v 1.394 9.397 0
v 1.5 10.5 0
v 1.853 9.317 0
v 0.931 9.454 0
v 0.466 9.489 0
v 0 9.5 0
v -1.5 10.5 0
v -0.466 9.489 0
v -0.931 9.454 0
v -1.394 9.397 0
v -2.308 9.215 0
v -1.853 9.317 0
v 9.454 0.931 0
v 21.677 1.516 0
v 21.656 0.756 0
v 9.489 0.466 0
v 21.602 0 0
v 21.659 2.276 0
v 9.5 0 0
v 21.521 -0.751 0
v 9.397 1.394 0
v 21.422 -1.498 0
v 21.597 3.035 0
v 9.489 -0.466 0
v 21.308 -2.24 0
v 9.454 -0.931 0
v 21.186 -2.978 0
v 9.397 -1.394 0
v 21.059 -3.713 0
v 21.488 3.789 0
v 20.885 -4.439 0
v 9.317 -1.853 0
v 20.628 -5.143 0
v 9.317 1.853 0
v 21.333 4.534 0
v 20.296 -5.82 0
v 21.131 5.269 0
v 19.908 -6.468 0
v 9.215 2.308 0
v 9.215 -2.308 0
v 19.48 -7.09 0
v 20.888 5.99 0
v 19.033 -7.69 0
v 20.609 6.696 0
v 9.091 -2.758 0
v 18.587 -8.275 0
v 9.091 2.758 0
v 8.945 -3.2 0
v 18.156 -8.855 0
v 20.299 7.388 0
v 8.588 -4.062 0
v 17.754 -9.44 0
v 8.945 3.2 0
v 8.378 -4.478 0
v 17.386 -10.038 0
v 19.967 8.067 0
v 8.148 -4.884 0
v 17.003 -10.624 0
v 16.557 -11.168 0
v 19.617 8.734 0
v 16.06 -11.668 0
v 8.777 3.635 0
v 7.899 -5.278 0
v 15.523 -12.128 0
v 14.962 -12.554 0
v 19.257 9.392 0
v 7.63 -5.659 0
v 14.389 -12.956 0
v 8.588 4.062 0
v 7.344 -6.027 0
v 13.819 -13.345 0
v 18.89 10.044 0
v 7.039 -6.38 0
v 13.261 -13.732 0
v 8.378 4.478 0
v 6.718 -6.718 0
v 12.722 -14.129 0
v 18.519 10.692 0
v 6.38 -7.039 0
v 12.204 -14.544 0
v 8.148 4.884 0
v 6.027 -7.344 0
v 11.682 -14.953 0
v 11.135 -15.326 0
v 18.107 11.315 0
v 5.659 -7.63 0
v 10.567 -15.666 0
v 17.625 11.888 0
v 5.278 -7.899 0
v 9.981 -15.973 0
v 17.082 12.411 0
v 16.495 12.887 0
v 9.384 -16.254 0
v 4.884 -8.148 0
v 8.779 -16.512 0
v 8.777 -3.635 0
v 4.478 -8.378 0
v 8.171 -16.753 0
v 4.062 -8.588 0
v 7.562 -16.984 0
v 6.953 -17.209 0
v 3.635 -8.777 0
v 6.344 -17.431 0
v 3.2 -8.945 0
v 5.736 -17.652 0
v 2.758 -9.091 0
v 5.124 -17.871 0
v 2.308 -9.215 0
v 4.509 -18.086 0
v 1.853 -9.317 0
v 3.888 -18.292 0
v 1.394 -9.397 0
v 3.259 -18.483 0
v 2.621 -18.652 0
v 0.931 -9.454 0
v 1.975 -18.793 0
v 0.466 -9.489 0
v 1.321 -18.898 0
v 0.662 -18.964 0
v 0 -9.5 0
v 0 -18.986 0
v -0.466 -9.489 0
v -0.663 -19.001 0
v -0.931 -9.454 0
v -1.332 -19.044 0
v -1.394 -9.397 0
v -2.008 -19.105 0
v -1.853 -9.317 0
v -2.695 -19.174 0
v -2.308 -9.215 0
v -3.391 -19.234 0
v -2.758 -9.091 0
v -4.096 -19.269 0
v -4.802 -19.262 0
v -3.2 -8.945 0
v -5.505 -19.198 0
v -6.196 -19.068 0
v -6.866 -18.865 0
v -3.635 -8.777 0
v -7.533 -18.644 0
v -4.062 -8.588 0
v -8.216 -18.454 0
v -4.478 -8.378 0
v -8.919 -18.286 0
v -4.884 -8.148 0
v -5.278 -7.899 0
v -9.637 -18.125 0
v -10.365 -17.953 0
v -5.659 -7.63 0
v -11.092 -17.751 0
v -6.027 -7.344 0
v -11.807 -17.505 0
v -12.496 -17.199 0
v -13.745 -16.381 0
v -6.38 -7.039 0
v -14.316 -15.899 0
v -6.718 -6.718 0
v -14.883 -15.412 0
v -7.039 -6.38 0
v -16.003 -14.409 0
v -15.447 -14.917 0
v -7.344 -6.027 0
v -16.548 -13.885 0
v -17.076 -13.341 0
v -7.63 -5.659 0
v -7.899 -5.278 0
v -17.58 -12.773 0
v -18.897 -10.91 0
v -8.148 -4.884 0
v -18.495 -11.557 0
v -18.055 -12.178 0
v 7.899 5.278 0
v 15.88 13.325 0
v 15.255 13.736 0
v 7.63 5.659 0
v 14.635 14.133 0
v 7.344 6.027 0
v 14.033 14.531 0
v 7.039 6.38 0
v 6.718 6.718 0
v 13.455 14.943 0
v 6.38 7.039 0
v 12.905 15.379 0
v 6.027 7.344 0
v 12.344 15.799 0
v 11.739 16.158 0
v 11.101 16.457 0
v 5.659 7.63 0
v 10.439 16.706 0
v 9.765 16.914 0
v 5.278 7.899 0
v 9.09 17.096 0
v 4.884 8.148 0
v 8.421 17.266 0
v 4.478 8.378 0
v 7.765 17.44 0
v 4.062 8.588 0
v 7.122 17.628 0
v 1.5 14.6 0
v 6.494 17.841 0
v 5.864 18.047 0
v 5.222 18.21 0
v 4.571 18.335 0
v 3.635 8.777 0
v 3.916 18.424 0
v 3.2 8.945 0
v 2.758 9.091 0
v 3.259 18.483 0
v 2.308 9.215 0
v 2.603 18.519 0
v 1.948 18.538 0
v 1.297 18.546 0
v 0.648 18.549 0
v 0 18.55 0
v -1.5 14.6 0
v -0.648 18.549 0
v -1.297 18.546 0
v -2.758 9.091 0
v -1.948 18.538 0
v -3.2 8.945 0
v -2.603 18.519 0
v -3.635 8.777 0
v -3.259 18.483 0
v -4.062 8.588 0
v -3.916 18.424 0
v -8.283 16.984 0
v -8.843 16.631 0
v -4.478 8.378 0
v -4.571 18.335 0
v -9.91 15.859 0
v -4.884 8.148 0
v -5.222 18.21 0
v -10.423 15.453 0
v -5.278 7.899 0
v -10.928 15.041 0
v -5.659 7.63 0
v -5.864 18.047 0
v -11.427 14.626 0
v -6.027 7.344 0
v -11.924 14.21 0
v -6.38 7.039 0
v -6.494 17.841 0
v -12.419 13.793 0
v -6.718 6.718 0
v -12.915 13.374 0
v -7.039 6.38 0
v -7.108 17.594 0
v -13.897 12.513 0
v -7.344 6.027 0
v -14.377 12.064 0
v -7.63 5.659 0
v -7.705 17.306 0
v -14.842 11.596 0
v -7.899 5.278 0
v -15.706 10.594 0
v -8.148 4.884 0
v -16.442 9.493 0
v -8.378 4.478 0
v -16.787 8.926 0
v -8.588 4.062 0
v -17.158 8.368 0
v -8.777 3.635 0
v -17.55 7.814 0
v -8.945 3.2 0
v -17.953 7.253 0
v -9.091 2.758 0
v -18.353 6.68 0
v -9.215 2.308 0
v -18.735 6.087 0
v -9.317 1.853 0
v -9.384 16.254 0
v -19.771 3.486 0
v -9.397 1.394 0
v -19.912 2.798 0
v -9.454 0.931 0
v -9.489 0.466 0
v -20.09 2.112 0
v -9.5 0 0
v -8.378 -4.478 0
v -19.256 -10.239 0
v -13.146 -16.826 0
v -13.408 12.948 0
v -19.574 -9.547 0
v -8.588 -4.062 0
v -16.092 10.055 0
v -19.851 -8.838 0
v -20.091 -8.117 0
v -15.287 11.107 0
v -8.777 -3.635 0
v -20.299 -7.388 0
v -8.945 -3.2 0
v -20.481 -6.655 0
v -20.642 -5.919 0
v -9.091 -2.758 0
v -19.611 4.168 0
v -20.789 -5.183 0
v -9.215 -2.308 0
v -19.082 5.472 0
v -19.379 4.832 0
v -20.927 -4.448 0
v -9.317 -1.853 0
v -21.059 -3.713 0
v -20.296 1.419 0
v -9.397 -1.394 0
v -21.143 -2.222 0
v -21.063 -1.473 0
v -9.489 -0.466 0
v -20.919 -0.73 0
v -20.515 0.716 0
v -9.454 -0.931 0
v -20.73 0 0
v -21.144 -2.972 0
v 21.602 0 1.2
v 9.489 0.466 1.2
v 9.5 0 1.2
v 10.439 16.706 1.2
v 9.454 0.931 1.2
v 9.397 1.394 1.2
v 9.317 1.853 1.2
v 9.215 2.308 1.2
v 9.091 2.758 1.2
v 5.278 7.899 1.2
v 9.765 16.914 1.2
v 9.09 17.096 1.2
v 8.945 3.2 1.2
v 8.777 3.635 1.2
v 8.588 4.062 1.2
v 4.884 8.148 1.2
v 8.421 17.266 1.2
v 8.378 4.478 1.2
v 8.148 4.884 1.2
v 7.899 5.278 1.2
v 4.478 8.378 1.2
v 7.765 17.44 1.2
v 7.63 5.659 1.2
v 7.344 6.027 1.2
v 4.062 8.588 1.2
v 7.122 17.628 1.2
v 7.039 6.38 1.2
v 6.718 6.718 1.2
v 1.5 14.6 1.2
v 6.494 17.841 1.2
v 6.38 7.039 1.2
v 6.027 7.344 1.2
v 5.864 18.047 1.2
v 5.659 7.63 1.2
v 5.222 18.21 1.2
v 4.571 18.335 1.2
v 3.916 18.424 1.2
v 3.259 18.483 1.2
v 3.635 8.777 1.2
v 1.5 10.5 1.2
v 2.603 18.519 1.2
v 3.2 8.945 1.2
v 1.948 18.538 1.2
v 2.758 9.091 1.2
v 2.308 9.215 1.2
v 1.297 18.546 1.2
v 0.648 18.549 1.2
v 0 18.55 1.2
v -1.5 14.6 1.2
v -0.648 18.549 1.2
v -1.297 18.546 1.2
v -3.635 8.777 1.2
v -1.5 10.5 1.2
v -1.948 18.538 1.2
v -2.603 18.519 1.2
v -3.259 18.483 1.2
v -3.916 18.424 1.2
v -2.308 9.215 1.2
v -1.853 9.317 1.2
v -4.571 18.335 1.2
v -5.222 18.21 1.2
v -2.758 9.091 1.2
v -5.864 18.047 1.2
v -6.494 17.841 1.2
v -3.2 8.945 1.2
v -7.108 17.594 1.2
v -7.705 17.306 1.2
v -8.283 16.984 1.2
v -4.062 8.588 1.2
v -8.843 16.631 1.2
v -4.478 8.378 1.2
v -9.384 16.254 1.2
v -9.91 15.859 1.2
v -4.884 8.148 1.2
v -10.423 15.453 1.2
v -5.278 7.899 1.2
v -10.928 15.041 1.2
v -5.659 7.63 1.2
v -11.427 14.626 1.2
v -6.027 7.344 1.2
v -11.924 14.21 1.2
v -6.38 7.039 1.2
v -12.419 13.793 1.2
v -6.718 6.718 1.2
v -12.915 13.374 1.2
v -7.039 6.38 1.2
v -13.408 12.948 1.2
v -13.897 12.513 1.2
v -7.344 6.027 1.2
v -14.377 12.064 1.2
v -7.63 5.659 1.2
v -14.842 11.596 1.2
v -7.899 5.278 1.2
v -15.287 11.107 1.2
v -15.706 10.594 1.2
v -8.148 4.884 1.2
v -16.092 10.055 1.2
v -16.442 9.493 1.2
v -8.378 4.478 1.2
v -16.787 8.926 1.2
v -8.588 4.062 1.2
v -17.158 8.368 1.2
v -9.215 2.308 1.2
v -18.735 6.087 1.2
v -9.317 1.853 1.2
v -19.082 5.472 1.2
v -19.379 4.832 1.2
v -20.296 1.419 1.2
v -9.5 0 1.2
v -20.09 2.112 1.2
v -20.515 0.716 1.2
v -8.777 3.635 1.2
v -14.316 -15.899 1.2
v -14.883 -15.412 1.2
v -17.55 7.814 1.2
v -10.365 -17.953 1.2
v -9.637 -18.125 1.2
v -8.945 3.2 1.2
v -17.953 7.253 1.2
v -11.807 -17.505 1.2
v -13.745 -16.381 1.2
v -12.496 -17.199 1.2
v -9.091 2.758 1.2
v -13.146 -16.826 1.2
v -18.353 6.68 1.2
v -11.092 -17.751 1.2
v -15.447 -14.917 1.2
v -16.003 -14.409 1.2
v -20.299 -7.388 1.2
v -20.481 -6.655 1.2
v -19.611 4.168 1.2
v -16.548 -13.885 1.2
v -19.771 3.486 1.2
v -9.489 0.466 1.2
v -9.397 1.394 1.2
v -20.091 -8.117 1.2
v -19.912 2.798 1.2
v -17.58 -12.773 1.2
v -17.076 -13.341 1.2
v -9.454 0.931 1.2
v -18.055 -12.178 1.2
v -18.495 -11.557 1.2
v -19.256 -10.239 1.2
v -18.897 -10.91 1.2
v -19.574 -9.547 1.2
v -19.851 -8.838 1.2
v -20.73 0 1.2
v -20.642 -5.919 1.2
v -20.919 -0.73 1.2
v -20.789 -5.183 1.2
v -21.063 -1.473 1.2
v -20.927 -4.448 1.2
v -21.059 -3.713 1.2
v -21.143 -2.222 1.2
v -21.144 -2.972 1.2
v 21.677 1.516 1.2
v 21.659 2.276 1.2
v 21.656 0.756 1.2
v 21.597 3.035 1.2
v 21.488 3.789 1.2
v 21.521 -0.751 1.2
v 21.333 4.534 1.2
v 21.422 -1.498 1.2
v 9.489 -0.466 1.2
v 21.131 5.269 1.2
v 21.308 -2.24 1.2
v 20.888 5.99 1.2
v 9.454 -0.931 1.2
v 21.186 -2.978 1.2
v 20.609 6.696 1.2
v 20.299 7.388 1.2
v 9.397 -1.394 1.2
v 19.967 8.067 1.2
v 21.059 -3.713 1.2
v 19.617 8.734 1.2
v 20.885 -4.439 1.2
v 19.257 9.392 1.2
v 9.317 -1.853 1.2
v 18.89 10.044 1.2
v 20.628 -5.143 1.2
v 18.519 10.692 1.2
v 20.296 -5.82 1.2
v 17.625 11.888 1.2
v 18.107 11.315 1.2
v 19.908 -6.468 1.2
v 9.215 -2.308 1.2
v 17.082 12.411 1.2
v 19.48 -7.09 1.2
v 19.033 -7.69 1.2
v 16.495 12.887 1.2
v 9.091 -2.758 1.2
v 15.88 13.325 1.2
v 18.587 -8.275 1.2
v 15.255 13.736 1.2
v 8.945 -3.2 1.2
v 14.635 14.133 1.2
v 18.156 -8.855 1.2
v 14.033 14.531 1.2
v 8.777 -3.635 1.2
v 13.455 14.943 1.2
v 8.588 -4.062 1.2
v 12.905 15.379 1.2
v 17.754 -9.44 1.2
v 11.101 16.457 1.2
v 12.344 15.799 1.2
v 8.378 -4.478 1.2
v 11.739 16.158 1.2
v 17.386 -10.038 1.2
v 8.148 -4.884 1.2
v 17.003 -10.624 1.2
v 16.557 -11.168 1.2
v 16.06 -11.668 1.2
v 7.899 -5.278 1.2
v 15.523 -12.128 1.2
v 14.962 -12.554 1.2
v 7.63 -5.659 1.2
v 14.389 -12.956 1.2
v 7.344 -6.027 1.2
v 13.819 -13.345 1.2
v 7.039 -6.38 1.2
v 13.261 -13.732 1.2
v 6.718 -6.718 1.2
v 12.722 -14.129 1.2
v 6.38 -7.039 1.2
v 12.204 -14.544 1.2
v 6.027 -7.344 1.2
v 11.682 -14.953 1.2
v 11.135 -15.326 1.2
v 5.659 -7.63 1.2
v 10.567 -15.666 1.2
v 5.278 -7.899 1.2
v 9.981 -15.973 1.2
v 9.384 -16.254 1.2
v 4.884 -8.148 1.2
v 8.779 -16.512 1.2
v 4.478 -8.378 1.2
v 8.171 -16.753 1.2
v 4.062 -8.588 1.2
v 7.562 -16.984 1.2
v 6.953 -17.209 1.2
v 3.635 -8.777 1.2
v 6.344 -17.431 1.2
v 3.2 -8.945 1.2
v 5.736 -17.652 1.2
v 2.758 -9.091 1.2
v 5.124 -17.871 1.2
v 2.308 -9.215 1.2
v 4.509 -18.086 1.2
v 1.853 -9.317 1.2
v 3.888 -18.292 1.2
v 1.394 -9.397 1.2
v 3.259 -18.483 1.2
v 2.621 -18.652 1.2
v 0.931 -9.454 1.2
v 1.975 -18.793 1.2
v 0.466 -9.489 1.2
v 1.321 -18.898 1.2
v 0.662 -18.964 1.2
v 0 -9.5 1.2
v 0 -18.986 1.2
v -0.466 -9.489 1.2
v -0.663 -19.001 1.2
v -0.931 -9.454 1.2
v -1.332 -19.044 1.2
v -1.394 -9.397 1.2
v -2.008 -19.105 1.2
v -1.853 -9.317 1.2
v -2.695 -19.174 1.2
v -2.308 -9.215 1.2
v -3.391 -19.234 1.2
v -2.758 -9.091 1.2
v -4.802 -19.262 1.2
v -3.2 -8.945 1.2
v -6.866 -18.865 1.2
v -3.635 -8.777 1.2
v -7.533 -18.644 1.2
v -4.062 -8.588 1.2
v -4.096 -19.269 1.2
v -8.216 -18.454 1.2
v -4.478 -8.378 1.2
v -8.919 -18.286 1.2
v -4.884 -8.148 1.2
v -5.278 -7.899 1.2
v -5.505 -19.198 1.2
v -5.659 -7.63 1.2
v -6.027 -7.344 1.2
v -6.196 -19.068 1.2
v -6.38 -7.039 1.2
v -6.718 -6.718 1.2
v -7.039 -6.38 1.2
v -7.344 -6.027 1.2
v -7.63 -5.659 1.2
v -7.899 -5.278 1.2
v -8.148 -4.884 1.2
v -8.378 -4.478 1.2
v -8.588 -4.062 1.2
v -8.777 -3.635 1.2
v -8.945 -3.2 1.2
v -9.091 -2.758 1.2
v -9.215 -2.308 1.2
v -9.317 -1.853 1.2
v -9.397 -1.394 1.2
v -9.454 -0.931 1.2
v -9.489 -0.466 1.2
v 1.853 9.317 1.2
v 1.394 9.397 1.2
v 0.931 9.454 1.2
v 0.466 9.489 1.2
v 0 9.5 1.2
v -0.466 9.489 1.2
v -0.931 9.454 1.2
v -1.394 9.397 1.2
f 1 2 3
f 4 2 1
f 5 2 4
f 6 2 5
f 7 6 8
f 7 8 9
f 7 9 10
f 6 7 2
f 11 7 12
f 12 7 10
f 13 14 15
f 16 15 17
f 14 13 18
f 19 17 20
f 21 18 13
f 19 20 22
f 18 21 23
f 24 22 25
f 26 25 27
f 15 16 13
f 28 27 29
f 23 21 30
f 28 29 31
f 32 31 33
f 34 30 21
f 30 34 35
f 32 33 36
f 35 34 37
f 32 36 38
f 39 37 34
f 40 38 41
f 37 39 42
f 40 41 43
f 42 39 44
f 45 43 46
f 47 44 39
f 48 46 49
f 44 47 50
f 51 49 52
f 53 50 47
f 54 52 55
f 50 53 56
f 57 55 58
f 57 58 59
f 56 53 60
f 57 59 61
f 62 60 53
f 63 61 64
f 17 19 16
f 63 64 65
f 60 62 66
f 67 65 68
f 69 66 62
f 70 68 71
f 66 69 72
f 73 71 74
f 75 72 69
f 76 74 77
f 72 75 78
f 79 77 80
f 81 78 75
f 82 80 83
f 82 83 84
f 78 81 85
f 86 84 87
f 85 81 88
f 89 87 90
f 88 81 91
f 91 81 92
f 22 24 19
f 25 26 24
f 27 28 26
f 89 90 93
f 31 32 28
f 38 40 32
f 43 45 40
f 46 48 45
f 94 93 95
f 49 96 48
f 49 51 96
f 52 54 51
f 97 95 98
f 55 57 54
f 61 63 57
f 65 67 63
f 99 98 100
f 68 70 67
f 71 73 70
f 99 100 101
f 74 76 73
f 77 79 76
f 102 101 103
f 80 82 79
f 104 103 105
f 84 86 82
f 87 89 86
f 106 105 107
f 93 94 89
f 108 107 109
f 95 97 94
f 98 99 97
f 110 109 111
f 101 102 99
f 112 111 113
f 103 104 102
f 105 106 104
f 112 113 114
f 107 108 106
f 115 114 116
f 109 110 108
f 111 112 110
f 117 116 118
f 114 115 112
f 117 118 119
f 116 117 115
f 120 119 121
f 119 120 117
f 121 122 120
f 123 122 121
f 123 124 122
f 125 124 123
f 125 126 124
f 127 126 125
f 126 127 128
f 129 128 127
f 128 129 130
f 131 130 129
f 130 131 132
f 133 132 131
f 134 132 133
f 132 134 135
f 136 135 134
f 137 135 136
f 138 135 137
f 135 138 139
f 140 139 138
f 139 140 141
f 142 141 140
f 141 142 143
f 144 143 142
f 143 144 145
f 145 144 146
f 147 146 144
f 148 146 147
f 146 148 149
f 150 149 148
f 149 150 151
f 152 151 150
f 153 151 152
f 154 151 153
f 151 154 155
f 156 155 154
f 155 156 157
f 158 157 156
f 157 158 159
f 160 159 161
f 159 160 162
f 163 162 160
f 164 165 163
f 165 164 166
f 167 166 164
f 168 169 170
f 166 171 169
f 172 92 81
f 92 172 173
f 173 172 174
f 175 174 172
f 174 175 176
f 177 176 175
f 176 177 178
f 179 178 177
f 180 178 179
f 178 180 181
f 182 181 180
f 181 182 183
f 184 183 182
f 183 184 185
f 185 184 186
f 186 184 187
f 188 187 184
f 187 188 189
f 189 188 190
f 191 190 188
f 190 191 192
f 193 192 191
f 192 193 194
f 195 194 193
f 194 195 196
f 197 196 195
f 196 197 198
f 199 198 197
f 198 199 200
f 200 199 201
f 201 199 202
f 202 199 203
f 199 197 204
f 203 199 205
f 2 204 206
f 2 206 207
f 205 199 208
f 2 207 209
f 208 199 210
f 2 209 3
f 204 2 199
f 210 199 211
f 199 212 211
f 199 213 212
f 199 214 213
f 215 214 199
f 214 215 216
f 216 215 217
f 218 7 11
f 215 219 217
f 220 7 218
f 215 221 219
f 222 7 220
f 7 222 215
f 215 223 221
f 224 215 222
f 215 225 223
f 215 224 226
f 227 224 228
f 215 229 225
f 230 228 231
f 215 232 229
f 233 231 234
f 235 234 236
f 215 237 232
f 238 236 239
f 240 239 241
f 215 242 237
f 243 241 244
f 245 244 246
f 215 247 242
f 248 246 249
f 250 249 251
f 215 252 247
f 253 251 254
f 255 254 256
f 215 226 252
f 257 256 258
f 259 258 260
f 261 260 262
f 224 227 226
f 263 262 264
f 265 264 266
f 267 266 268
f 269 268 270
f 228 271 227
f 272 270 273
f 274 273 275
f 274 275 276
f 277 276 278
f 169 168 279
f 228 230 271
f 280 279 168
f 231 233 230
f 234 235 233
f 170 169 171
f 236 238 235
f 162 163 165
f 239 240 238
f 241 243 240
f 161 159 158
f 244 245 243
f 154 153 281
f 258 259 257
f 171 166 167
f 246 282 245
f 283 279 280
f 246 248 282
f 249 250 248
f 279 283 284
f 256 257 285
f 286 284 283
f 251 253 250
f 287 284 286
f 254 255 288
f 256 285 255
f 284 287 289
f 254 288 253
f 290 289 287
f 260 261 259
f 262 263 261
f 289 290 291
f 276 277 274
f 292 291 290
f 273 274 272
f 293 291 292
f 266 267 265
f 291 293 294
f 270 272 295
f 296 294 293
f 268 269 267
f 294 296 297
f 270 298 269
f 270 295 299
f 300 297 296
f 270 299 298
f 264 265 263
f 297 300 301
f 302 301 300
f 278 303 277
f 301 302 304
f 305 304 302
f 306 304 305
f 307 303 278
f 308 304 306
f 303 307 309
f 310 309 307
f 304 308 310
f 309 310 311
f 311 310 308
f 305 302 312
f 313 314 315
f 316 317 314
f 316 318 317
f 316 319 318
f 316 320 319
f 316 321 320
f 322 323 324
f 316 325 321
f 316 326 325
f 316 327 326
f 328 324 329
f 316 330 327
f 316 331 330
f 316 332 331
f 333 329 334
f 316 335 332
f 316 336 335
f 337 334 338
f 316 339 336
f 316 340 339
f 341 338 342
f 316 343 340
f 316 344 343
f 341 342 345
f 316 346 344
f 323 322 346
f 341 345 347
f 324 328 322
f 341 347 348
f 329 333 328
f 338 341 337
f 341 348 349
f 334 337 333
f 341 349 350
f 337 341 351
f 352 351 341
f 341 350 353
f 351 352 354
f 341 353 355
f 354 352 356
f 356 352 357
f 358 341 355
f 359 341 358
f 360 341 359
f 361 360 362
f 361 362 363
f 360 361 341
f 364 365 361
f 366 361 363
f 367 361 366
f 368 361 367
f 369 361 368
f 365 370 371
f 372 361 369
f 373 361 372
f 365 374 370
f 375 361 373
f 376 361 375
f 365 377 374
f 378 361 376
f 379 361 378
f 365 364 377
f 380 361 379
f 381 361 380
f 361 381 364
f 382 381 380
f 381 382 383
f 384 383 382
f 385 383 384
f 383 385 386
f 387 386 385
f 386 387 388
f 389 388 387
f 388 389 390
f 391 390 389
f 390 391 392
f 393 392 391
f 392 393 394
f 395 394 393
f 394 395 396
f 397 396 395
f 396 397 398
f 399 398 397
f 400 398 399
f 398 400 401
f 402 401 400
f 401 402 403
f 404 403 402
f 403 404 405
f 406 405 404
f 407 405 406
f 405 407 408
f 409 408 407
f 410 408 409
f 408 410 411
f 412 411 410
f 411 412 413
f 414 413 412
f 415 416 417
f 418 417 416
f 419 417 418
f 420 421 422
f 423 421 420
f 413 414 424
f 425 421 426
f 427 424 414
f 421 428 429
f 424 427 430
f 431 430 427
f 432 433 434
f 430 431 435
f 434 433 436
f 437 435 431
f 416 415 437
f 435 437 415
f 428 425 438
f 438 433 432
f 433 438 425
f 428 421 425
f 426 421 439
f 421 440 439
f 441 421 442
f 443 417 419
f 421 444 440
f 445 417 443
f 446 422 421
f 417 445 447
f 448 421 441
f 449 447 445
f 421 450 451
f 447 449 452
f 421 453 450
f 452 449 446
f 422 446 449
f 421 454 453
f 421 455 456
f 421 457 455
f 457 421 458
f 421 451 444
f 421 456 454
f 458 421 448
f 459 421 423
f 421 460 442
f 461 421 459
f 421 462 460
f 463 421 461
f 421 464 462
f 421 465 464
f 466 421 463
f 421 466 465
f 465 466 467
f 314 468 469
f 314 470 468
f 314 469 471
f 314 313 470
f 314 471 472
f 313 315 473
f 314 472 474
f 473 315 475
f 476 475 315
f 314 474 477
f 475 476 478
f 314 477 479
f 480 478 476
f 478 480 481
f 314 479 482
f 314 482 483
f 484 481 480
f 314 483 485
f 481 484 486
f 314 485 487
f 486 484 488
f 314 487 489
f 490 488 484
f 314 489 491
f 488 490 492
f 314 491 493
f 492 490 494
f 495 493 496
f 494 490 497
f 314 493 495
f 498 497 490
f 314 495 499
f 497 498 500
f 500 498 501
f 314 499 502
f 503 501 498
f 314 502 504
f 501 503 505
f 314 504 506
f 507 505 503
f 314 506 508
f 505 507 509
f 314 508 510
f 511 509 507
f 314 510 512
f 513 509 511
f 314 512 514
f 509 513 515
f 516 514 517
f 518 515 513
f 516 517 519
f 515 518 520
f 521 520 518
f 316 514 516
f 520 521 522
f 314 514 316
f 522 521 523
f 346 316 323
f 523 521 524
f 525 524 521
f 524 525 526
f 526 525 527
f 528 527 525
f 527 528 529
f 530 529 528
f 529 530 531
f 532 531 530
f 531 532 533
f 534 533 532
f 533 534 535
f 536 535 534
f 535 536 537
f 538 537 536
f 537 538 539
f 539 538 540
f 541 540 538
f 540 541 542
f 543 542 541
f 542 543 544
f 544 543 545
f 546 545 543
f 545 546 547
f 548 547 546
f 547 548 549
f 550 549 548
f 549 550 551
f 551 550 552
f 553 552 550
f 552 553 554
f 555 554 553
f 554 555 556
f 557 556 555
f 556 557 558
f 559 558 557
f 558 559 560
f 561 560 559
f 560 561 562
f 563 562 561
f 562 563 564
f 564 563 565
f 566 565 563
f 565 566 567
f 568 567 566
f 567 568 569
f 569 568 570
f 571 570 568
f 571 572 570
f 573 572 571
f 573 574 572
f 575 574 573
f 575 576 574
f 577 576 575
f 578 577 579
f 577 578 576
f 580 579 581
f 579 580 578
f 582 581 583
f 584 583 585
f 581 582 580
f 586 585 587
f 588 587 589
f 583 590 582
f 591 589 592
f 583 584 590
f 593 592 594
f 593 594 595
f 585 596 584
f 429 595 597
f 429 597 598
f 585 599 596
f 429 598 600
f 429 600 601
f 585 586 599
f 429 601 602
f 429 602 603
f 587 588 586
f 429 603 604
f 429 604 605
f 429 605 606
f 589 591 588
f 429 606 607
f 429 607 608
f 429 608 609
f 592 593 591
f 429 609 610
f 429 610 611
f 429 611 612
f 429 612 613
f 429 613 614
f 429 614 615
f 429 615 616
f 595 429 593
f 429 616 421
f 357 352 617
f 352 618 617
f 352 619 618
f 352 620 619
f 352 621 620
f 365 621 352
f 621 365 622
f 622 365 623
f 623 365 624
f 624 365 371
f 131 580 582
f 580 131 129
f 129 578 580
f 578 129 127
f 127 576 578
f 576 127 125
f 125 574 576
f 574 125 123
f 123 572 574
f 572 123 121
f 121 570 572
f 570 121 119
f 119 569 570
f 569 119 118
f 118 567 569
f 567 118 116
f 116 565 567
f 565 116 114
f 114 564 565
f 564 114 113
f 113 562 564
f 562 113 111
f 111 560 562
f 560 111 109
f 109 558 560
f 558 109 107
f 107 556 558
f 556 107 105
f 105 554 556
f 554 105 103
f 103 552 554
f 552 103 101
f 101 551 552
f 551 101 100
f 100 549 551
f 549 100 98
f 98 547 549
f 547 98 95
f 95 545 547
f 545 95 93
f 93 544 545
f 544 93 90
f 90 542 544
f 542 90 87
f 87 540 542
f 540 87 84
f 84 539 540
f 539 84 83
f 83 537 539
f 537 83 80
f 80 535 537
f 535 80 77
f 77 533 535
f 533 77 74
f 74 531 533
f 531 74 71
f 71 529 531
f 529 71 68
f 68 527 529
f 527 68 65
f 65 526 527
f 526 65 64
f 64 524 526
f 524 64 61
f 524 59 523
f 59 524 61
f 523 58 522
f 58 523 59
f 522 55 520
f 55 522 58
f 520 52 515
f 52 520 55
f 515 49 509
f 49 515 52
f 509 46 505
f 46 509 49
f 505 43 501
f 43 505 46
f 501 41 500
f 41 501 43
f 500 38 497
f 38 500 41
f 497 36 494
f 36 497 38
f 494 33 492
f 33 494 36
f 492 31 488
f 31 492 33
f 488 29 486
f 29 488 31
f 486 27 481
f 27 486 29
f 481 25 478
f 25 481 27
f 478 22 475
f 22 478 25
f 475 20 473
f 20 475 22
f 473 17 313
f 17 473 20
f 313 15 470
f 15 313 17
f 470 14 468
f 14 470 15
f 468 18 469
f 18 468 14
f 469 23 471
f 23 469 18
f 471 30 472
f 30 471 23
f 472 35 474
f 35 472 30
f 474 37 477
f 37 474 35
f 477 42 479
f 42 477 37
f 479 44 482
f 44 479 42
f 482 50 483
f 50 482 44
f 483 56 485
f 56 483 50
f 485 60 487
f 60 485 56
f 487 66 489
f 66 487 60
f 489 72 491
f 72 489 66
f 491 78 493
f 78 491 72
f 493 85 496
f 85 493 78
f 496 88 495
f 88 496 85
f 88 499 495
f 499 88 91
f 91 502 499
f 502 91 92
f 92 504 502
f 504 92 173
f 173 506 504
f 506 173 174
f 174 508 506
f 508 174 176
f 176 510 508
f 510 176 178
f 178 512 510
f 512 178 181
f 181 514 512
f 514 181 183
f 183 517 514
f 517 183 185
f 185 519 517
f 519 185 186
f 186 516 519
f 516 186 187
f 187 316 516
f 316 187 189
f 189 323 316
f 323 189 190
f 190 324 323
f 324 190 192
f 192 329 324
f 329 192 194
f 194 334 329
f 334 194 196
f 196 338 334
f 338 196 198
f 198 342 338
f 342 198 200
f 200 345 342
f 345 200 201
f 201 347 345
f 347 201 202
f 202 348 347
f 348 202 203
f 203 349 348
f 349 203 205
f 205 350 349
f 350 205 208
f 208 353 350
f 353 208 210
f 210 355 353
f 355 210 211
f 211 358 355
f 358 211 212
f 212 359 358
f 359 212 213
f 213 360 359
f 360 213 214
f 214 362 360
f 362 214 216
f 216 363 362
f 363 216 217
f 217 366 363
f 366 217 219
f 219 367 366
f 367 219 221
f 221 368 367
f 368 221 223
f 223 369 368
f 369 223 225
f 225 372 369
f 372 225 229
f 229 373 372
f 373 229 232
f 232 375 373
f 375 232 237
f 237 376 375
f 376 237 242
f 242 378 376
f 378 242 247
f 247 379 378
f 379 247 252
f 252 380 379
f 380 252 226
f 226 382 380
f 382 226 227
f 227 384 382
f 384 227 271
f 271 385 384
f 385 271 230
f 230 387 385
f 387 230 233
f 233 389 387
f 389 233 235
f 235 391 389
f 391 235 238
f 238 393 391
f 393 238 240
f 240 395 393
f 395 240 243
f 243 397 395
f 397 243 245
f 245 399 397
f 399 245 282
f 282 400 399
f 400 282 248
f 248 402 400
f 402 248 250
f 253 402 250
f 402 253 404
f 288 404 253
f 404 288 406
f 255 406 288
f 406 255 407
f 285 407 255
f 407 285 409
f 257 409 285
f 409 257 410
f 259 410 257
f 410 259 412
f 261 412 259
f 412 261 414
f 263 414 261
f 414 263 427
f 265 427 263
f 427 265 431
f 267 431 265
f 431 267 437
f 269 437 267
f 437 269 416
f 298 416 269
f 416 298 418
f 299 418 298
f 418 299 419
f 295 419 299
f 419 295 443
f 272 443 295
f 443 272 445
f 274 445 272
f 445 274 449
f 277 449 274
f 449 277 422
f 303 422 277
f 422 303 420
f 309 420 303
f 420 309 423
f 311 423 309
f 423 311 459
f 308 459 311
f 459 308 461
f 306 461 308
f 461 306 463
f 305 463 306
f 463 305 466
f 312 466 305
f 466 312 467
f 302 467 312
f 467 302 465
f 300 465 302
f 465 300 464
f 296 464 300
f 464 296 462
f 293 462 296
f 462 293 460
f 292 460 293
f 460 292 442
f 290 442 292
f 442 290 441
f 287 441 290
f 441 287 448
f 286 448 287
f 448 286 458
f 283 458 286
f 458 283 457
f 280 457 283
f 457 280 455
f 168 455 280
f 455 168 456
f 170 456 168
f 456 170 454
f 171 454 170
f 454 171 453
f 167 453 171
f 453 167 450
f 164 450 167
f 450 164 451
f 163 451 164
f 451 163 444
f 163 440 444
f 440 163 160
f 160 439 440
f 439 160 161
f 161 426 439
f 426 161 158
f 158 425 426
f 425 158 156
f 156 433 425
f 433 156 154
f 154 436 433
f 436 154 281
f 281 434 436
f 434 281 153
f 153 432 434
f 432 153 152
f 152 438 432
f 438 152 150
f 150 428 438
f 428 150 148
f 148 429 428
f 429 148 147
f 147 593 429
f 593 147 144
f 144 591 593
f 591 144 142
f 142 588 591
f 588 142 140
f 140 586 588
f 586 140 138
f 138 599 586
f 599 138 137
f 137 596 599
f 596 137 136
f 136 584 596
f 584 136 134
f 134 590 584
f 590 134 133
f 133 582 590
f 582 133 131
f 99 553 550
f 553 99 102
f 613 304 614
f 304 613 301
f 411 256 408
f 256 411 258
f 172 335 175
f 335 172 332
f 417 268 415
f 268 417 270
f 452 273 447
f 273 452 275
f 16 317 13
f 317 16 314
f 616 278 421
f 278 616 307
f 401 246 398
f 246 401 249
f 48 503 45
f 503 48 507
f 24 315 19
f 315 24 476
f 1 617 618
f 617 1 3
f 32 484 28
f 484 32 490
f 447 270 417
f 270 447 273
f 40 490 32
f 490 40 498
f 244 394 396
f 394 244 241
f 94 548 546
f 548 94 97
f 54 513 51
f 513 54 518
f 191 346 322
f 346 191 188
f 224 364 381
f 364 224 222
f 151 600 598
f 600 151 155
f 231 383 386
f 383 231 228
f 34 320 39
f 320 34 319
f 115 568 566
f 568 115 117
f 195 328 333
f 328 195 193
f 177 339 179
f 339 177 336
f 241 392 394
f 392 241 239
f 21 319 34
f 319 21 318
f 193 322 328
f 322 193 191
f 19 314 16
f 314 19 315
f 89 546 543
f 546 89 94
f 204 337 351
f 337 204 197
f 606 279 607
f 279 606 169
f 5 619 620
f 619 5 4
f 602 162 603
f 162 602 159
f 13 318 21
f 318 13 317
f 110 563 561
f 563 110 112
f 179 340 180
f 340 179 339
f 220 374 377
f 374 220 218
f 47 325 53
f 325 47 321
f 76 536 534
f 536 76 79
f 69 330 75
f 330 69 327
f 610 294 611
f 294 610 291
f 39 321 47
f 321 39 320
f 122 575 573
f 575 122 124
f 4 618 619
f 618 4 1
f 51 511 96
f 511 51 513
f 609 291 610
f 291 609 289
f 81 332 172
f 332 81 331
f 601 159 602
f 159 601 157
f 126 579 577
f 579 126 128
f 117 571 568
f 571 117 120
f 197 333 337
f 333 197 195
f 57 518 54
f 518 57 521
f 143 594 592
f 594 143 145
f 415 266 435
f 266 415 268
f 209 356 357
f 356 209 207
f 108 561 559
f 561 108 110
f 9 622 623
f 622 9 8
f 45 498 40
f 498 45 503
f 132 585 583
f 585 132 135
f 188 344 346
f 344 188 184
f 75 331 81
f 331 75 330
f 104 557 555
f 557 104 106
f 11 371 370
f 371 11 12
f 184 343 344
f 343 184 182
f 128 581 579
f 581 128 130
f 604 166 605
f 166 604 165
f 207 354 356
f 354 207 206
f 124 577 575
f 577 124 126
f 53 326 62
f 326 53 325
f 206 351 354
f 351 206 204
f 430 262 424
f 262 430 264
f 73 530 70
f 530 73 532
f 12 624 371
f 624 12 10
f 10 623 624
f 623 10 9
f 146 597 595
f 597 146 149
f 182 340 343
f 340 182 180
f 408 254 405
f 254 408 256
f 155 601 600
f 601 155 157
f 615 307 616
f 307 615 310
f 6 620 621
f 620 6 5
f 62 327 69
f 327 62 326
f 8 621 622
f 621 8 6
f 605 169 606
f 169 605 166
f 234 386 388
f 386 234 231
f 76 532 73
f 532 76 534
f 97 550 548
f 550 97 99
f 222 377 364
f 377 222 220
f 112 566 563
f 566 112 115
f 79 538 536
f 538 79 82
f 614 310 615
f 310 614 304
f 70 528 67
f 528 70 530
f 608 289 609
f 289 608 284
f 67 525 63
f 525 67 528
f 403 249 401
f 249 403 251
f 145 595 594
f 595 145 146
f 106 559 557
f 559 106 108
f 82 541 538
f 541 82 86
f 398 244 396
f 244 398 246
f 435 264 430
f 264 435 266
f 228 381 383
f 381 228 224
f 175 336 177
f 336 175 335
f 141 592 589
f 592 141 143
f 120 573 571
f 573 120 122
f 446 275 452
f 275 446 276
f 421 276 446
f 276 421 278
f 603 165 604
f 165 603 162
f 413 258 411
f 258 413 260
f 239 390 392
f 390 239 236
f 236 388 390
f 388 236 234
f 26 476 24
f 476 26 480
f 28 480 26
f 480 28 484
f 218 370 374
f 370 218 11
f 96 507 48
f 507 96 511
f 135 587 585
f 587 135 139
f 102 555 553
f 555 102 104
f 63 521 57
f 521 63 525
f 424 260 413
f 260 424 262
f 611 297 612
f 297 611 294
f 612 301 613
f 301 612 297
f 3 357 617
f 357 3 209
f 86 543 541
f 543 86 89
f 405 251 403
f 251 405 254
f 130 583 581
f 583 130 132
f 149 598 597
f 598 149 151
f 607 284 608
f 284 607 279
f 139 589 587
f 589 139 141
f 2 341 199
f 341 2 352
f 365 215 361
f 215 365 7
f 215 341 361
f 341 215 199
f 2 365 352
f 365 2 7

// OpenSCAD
/*
  Elna Supermatic cam 18
  Name: Deep scallop
  Status: candidate

  Generated from measured parametric base v2.
  Surface mode: smooth
*/

include <_elna_measured_common.scad>;

profile_points = [
        [0.0000, 18.5500],
        [0.6478, 18.5494],
        [1.2969, 18.5463],
        [1.9484, 18.5378],
        [2.6026, 18.5186],
        [3.2590, 18.4829],
        [3.9161, 18.4238],
        [4.5714, 18.3348],
        [5.2218, 18.2105],
        [5.8637, 18.0466],
        [6.4936, 17.8410],
        [7.1223, 17.6282],
        [7.7646, 17.4397],
        [8.4214, 17.2664],
        [9.0902, 17.0961],
        [9.7655, 16.9143],
        [10.4391, 16.7061],
        [11.1007, 16.4575],
        [11.7392, 16.1576],
        [12.3436, 15.7991],
        [12.9046, 15.3791],
        [13.4549, 14.9432],
        [14.0327, 14.5313],
        [14.6354, 14.1332],
        [15.2552, 13.7358],
        [15.8801, 13.3250],
        [16.4947, 12.8871],
        [17.0819, 12.4107],
        [17.6246, 11.8879],
        [18.1075, 11.3148],
        [18.5191, 10.6920],
        [18.8904, 10.0442],
        [19.2572, 9.3924],
        [19.6173, 8.7342],
        [19.9666, 8.0670],
        [20.2992, 7.3883],
        [20.6088, 6.6962],
        [20.8883, 5.9896],
        [21.1315, 5.2687],
        [21.3327, 4.5344],
        [21.4885, 3.7890],
        [21.5971, 3.0353],
        [21.6591, 2.2765],
        [21.6772, 1.5158],
        [21.6562, 0.7562],
        [21.6020, 0.0000],
        [21.5215, -0.7515],
        [21.4216, -1.4979],
        [21.3083, -2.2396],
        [21.1865, -2.9776],
        [21.0591, -3.7133],
        [20.8854, -4.4393],
        [20.6276, -5.1430],
        [20.2965, -5.8199],
        [19.9076, -6.4684],
        [19.4798, -7.0901],
        [19.0331, -7.6899],
        [18.5866, -8.2753],
        [18.1565, -8.8555],
        [17.7543, -9.4401],
        [17.3863, -10.0380],
        [17.0028, -10.6245],
        [16.5575, -11.1682],
        [16.0601, -11.6683],
        [15.5234, -12.1282],
        [14.9616, -12.5543],
        [14.3892, -12.9561],
        [13.8190, -13.3448],
        [13.2611, -13.7323],
        [12.7220, -14.1292],
        [12.2040, -14.5441],
        [11.6824, -14.9528],
        [11.1352, -15.3263],
        [10.5666, -15.6656],
        [9.9812, -15.9733],
        [9.3840, -16.2536],
        [8.7794, -16.5117],
        [8.1712, -16.7534],
        [7.5619, -16.9843],
        [6.9529, -17.2092],
        [6.3445, -17.4313],
        [5.7356, -17.6522],
        [5.1245, -17.8714],
        [4.5094, -18.0862],
        [3.8881, -18.2920],
        [3.2590, -18.4829],
        [2.6214, -18.6521],
        [1.9752, -18.7926],
        [1.3215, -18.8982],
        [0.6622, -18.9638],
        [0.0000, -18.9860],
        [-0.6635, -19.0011],
        [-1.3317, -19.0436],
        [-2.0081, -19.1054],
        [-2.6948, -19.1742],
        [-3.3915, -19.2343],
        [-4.0957, -19.2689],
        [-4.8025, -19.2617],
        [-5.5050, -19.1982],
        [-6.1956, -19.0680],
        [-6.8664, -18.8653],
        [-7.5326, -18.6438],
        [-8.2164, -18.4544],
        [-8.9189, -18.2865],
        [-9.6373, -18.1251],
        [-10.3650, -17.9527],
        [-11.0923, -17.7514],
        [-11.8070, -17.5046],
        [-12.4958, -17.1990],
        [-13.1456, -16.8256],
        [-13.7454, -16.3811],
        [-14.3158, -15.8993],
        [-14.8835, -15.4123],
        [-15.4470, -14.9170],
        [-16.0034, -14.4095],
        [-16.5481, -13.8855],
        [-17.0757, -13.3410],
        [-17.5801, -12.7727],
        [-18.0551, -12.1783],
        [-18.4954, -11.5572],
        [-18.8967, -10.9100],
        [-19.2565, -10.2389],
        [-19.5743, -9.5470],
        [-19.8515, -8.8384],
        [-20.0915, -8.1175],
        [-20.2992, -7.3883],
        [-20.4807, -6.6546],
        [-20.6420, -5.9190],
        [-20.7892, -5.1833],
        [-20.9271, -4.4482],
        [-21.0591, -3.7133],
        [-21.1442, -2.9716],
        [-21.1426, -2.2222],
        [-21.0630, -1.4729],
        [-20.9193, -0.7305],
        [-20.7300, -0.0000],
        [-20.5154, 0.7164],
        [-20.2960, 1.4192],
        [-20.0902, 2.1116],
        [-19.9123, 2.7985],
        [-19.7710, 3.4862],
        [-19.6112, 4.1685],
        [-19.3787, 4.8316],
        [-19.0823, 5.4718],
        [-18.7353, 6.0875],
        [-18.3531, 6.6800],
        [-17.9527, 7.2534],
        [-17.5498, 7.8137],
        [-17.1581, 8.3685],
        [-16.7872, 8.9259],
        [-16.4424, 9.4930],
        [-16.0920, 10.0554],
        [-15.7056, 10.5936],
        [-15.2873, 11.1069],
        [-14.8425, 11.5962],
        [-14.3771, 12.0638],
        [-13.8973, 12.5132],
        [-13.4084, 12.9483],
        [-12.9148, 13.3737],
        [-12.4195, 13.7933],
        [-11.9237, 14.2101],
        [-11.4271, 14.6260],
        [-10.9279, 15.0409],
        [-10.4233, 15.4531],
        [-9.9098, 15.8590],
        [-9.3840, 16.2536],
        [-8.8427, 16.6306],
        [-8.2835, 16.9837],
        [-7.7054, 17.3065],
        [-7.1083, 17.5936],
        [-6.4936, 17.8410],
        [-5.8637, 18.0466],
        [-5.2218, 18.2105],
        [-4.5714, 18.3348],
        [-3.9161, 18.4238],
        [-3.2590, 18.4829],
        [-2.6026, 18.5186],
        [-1.9484, 18.5378],
        [-1.2969, 18.5463],
        [-0.6478, 18.5494]
];

icon_points = [[-1.000,0.100], [-0.959,0.257], [-0.918,0.408], [-0.878,0.547], [-0.837,0.670], [-0.796,0.773], [-0.755,0.850], [-0.714,0.899], [-0.673,0.920], [-0.633,0.909], [-0.592,0.870], [-0.551,0.801], [-0.510,0.707], [-0.469,0.590], [-0.429,0.456], [-0.388,0.308], [-0.347,0.153], [-0.306,0.205], [-0.265,0.358], [-0.224,0.502], [-0.184,0.632], [-0.143,0.741], [-0.102,0.827], [-0.061,0.886], [-0.020,0.916], [0.020,0.916], [0.061,0.886], [0.102,0.827], [0.143,0.741], [0.184,0.632], [0.224,0.502], [0.265,0.358], [0.306,0.205], [0.347,0.153], [0.388,0.308], [0.429,0.456], [0.469,0.590], [0.510,0.707], [0.551,0.801], [0.592,0.870], [0.633,0.909], [0.673,0.920], [0.714,0.899], [0.755,0.850], [0.796,0.773], [0.837,0.670], [0.878,0.547], [0.918,0.408], [0.959,0.257], [1.000,0.100]];

elna_cam_ring(profile_points=profile_points);
